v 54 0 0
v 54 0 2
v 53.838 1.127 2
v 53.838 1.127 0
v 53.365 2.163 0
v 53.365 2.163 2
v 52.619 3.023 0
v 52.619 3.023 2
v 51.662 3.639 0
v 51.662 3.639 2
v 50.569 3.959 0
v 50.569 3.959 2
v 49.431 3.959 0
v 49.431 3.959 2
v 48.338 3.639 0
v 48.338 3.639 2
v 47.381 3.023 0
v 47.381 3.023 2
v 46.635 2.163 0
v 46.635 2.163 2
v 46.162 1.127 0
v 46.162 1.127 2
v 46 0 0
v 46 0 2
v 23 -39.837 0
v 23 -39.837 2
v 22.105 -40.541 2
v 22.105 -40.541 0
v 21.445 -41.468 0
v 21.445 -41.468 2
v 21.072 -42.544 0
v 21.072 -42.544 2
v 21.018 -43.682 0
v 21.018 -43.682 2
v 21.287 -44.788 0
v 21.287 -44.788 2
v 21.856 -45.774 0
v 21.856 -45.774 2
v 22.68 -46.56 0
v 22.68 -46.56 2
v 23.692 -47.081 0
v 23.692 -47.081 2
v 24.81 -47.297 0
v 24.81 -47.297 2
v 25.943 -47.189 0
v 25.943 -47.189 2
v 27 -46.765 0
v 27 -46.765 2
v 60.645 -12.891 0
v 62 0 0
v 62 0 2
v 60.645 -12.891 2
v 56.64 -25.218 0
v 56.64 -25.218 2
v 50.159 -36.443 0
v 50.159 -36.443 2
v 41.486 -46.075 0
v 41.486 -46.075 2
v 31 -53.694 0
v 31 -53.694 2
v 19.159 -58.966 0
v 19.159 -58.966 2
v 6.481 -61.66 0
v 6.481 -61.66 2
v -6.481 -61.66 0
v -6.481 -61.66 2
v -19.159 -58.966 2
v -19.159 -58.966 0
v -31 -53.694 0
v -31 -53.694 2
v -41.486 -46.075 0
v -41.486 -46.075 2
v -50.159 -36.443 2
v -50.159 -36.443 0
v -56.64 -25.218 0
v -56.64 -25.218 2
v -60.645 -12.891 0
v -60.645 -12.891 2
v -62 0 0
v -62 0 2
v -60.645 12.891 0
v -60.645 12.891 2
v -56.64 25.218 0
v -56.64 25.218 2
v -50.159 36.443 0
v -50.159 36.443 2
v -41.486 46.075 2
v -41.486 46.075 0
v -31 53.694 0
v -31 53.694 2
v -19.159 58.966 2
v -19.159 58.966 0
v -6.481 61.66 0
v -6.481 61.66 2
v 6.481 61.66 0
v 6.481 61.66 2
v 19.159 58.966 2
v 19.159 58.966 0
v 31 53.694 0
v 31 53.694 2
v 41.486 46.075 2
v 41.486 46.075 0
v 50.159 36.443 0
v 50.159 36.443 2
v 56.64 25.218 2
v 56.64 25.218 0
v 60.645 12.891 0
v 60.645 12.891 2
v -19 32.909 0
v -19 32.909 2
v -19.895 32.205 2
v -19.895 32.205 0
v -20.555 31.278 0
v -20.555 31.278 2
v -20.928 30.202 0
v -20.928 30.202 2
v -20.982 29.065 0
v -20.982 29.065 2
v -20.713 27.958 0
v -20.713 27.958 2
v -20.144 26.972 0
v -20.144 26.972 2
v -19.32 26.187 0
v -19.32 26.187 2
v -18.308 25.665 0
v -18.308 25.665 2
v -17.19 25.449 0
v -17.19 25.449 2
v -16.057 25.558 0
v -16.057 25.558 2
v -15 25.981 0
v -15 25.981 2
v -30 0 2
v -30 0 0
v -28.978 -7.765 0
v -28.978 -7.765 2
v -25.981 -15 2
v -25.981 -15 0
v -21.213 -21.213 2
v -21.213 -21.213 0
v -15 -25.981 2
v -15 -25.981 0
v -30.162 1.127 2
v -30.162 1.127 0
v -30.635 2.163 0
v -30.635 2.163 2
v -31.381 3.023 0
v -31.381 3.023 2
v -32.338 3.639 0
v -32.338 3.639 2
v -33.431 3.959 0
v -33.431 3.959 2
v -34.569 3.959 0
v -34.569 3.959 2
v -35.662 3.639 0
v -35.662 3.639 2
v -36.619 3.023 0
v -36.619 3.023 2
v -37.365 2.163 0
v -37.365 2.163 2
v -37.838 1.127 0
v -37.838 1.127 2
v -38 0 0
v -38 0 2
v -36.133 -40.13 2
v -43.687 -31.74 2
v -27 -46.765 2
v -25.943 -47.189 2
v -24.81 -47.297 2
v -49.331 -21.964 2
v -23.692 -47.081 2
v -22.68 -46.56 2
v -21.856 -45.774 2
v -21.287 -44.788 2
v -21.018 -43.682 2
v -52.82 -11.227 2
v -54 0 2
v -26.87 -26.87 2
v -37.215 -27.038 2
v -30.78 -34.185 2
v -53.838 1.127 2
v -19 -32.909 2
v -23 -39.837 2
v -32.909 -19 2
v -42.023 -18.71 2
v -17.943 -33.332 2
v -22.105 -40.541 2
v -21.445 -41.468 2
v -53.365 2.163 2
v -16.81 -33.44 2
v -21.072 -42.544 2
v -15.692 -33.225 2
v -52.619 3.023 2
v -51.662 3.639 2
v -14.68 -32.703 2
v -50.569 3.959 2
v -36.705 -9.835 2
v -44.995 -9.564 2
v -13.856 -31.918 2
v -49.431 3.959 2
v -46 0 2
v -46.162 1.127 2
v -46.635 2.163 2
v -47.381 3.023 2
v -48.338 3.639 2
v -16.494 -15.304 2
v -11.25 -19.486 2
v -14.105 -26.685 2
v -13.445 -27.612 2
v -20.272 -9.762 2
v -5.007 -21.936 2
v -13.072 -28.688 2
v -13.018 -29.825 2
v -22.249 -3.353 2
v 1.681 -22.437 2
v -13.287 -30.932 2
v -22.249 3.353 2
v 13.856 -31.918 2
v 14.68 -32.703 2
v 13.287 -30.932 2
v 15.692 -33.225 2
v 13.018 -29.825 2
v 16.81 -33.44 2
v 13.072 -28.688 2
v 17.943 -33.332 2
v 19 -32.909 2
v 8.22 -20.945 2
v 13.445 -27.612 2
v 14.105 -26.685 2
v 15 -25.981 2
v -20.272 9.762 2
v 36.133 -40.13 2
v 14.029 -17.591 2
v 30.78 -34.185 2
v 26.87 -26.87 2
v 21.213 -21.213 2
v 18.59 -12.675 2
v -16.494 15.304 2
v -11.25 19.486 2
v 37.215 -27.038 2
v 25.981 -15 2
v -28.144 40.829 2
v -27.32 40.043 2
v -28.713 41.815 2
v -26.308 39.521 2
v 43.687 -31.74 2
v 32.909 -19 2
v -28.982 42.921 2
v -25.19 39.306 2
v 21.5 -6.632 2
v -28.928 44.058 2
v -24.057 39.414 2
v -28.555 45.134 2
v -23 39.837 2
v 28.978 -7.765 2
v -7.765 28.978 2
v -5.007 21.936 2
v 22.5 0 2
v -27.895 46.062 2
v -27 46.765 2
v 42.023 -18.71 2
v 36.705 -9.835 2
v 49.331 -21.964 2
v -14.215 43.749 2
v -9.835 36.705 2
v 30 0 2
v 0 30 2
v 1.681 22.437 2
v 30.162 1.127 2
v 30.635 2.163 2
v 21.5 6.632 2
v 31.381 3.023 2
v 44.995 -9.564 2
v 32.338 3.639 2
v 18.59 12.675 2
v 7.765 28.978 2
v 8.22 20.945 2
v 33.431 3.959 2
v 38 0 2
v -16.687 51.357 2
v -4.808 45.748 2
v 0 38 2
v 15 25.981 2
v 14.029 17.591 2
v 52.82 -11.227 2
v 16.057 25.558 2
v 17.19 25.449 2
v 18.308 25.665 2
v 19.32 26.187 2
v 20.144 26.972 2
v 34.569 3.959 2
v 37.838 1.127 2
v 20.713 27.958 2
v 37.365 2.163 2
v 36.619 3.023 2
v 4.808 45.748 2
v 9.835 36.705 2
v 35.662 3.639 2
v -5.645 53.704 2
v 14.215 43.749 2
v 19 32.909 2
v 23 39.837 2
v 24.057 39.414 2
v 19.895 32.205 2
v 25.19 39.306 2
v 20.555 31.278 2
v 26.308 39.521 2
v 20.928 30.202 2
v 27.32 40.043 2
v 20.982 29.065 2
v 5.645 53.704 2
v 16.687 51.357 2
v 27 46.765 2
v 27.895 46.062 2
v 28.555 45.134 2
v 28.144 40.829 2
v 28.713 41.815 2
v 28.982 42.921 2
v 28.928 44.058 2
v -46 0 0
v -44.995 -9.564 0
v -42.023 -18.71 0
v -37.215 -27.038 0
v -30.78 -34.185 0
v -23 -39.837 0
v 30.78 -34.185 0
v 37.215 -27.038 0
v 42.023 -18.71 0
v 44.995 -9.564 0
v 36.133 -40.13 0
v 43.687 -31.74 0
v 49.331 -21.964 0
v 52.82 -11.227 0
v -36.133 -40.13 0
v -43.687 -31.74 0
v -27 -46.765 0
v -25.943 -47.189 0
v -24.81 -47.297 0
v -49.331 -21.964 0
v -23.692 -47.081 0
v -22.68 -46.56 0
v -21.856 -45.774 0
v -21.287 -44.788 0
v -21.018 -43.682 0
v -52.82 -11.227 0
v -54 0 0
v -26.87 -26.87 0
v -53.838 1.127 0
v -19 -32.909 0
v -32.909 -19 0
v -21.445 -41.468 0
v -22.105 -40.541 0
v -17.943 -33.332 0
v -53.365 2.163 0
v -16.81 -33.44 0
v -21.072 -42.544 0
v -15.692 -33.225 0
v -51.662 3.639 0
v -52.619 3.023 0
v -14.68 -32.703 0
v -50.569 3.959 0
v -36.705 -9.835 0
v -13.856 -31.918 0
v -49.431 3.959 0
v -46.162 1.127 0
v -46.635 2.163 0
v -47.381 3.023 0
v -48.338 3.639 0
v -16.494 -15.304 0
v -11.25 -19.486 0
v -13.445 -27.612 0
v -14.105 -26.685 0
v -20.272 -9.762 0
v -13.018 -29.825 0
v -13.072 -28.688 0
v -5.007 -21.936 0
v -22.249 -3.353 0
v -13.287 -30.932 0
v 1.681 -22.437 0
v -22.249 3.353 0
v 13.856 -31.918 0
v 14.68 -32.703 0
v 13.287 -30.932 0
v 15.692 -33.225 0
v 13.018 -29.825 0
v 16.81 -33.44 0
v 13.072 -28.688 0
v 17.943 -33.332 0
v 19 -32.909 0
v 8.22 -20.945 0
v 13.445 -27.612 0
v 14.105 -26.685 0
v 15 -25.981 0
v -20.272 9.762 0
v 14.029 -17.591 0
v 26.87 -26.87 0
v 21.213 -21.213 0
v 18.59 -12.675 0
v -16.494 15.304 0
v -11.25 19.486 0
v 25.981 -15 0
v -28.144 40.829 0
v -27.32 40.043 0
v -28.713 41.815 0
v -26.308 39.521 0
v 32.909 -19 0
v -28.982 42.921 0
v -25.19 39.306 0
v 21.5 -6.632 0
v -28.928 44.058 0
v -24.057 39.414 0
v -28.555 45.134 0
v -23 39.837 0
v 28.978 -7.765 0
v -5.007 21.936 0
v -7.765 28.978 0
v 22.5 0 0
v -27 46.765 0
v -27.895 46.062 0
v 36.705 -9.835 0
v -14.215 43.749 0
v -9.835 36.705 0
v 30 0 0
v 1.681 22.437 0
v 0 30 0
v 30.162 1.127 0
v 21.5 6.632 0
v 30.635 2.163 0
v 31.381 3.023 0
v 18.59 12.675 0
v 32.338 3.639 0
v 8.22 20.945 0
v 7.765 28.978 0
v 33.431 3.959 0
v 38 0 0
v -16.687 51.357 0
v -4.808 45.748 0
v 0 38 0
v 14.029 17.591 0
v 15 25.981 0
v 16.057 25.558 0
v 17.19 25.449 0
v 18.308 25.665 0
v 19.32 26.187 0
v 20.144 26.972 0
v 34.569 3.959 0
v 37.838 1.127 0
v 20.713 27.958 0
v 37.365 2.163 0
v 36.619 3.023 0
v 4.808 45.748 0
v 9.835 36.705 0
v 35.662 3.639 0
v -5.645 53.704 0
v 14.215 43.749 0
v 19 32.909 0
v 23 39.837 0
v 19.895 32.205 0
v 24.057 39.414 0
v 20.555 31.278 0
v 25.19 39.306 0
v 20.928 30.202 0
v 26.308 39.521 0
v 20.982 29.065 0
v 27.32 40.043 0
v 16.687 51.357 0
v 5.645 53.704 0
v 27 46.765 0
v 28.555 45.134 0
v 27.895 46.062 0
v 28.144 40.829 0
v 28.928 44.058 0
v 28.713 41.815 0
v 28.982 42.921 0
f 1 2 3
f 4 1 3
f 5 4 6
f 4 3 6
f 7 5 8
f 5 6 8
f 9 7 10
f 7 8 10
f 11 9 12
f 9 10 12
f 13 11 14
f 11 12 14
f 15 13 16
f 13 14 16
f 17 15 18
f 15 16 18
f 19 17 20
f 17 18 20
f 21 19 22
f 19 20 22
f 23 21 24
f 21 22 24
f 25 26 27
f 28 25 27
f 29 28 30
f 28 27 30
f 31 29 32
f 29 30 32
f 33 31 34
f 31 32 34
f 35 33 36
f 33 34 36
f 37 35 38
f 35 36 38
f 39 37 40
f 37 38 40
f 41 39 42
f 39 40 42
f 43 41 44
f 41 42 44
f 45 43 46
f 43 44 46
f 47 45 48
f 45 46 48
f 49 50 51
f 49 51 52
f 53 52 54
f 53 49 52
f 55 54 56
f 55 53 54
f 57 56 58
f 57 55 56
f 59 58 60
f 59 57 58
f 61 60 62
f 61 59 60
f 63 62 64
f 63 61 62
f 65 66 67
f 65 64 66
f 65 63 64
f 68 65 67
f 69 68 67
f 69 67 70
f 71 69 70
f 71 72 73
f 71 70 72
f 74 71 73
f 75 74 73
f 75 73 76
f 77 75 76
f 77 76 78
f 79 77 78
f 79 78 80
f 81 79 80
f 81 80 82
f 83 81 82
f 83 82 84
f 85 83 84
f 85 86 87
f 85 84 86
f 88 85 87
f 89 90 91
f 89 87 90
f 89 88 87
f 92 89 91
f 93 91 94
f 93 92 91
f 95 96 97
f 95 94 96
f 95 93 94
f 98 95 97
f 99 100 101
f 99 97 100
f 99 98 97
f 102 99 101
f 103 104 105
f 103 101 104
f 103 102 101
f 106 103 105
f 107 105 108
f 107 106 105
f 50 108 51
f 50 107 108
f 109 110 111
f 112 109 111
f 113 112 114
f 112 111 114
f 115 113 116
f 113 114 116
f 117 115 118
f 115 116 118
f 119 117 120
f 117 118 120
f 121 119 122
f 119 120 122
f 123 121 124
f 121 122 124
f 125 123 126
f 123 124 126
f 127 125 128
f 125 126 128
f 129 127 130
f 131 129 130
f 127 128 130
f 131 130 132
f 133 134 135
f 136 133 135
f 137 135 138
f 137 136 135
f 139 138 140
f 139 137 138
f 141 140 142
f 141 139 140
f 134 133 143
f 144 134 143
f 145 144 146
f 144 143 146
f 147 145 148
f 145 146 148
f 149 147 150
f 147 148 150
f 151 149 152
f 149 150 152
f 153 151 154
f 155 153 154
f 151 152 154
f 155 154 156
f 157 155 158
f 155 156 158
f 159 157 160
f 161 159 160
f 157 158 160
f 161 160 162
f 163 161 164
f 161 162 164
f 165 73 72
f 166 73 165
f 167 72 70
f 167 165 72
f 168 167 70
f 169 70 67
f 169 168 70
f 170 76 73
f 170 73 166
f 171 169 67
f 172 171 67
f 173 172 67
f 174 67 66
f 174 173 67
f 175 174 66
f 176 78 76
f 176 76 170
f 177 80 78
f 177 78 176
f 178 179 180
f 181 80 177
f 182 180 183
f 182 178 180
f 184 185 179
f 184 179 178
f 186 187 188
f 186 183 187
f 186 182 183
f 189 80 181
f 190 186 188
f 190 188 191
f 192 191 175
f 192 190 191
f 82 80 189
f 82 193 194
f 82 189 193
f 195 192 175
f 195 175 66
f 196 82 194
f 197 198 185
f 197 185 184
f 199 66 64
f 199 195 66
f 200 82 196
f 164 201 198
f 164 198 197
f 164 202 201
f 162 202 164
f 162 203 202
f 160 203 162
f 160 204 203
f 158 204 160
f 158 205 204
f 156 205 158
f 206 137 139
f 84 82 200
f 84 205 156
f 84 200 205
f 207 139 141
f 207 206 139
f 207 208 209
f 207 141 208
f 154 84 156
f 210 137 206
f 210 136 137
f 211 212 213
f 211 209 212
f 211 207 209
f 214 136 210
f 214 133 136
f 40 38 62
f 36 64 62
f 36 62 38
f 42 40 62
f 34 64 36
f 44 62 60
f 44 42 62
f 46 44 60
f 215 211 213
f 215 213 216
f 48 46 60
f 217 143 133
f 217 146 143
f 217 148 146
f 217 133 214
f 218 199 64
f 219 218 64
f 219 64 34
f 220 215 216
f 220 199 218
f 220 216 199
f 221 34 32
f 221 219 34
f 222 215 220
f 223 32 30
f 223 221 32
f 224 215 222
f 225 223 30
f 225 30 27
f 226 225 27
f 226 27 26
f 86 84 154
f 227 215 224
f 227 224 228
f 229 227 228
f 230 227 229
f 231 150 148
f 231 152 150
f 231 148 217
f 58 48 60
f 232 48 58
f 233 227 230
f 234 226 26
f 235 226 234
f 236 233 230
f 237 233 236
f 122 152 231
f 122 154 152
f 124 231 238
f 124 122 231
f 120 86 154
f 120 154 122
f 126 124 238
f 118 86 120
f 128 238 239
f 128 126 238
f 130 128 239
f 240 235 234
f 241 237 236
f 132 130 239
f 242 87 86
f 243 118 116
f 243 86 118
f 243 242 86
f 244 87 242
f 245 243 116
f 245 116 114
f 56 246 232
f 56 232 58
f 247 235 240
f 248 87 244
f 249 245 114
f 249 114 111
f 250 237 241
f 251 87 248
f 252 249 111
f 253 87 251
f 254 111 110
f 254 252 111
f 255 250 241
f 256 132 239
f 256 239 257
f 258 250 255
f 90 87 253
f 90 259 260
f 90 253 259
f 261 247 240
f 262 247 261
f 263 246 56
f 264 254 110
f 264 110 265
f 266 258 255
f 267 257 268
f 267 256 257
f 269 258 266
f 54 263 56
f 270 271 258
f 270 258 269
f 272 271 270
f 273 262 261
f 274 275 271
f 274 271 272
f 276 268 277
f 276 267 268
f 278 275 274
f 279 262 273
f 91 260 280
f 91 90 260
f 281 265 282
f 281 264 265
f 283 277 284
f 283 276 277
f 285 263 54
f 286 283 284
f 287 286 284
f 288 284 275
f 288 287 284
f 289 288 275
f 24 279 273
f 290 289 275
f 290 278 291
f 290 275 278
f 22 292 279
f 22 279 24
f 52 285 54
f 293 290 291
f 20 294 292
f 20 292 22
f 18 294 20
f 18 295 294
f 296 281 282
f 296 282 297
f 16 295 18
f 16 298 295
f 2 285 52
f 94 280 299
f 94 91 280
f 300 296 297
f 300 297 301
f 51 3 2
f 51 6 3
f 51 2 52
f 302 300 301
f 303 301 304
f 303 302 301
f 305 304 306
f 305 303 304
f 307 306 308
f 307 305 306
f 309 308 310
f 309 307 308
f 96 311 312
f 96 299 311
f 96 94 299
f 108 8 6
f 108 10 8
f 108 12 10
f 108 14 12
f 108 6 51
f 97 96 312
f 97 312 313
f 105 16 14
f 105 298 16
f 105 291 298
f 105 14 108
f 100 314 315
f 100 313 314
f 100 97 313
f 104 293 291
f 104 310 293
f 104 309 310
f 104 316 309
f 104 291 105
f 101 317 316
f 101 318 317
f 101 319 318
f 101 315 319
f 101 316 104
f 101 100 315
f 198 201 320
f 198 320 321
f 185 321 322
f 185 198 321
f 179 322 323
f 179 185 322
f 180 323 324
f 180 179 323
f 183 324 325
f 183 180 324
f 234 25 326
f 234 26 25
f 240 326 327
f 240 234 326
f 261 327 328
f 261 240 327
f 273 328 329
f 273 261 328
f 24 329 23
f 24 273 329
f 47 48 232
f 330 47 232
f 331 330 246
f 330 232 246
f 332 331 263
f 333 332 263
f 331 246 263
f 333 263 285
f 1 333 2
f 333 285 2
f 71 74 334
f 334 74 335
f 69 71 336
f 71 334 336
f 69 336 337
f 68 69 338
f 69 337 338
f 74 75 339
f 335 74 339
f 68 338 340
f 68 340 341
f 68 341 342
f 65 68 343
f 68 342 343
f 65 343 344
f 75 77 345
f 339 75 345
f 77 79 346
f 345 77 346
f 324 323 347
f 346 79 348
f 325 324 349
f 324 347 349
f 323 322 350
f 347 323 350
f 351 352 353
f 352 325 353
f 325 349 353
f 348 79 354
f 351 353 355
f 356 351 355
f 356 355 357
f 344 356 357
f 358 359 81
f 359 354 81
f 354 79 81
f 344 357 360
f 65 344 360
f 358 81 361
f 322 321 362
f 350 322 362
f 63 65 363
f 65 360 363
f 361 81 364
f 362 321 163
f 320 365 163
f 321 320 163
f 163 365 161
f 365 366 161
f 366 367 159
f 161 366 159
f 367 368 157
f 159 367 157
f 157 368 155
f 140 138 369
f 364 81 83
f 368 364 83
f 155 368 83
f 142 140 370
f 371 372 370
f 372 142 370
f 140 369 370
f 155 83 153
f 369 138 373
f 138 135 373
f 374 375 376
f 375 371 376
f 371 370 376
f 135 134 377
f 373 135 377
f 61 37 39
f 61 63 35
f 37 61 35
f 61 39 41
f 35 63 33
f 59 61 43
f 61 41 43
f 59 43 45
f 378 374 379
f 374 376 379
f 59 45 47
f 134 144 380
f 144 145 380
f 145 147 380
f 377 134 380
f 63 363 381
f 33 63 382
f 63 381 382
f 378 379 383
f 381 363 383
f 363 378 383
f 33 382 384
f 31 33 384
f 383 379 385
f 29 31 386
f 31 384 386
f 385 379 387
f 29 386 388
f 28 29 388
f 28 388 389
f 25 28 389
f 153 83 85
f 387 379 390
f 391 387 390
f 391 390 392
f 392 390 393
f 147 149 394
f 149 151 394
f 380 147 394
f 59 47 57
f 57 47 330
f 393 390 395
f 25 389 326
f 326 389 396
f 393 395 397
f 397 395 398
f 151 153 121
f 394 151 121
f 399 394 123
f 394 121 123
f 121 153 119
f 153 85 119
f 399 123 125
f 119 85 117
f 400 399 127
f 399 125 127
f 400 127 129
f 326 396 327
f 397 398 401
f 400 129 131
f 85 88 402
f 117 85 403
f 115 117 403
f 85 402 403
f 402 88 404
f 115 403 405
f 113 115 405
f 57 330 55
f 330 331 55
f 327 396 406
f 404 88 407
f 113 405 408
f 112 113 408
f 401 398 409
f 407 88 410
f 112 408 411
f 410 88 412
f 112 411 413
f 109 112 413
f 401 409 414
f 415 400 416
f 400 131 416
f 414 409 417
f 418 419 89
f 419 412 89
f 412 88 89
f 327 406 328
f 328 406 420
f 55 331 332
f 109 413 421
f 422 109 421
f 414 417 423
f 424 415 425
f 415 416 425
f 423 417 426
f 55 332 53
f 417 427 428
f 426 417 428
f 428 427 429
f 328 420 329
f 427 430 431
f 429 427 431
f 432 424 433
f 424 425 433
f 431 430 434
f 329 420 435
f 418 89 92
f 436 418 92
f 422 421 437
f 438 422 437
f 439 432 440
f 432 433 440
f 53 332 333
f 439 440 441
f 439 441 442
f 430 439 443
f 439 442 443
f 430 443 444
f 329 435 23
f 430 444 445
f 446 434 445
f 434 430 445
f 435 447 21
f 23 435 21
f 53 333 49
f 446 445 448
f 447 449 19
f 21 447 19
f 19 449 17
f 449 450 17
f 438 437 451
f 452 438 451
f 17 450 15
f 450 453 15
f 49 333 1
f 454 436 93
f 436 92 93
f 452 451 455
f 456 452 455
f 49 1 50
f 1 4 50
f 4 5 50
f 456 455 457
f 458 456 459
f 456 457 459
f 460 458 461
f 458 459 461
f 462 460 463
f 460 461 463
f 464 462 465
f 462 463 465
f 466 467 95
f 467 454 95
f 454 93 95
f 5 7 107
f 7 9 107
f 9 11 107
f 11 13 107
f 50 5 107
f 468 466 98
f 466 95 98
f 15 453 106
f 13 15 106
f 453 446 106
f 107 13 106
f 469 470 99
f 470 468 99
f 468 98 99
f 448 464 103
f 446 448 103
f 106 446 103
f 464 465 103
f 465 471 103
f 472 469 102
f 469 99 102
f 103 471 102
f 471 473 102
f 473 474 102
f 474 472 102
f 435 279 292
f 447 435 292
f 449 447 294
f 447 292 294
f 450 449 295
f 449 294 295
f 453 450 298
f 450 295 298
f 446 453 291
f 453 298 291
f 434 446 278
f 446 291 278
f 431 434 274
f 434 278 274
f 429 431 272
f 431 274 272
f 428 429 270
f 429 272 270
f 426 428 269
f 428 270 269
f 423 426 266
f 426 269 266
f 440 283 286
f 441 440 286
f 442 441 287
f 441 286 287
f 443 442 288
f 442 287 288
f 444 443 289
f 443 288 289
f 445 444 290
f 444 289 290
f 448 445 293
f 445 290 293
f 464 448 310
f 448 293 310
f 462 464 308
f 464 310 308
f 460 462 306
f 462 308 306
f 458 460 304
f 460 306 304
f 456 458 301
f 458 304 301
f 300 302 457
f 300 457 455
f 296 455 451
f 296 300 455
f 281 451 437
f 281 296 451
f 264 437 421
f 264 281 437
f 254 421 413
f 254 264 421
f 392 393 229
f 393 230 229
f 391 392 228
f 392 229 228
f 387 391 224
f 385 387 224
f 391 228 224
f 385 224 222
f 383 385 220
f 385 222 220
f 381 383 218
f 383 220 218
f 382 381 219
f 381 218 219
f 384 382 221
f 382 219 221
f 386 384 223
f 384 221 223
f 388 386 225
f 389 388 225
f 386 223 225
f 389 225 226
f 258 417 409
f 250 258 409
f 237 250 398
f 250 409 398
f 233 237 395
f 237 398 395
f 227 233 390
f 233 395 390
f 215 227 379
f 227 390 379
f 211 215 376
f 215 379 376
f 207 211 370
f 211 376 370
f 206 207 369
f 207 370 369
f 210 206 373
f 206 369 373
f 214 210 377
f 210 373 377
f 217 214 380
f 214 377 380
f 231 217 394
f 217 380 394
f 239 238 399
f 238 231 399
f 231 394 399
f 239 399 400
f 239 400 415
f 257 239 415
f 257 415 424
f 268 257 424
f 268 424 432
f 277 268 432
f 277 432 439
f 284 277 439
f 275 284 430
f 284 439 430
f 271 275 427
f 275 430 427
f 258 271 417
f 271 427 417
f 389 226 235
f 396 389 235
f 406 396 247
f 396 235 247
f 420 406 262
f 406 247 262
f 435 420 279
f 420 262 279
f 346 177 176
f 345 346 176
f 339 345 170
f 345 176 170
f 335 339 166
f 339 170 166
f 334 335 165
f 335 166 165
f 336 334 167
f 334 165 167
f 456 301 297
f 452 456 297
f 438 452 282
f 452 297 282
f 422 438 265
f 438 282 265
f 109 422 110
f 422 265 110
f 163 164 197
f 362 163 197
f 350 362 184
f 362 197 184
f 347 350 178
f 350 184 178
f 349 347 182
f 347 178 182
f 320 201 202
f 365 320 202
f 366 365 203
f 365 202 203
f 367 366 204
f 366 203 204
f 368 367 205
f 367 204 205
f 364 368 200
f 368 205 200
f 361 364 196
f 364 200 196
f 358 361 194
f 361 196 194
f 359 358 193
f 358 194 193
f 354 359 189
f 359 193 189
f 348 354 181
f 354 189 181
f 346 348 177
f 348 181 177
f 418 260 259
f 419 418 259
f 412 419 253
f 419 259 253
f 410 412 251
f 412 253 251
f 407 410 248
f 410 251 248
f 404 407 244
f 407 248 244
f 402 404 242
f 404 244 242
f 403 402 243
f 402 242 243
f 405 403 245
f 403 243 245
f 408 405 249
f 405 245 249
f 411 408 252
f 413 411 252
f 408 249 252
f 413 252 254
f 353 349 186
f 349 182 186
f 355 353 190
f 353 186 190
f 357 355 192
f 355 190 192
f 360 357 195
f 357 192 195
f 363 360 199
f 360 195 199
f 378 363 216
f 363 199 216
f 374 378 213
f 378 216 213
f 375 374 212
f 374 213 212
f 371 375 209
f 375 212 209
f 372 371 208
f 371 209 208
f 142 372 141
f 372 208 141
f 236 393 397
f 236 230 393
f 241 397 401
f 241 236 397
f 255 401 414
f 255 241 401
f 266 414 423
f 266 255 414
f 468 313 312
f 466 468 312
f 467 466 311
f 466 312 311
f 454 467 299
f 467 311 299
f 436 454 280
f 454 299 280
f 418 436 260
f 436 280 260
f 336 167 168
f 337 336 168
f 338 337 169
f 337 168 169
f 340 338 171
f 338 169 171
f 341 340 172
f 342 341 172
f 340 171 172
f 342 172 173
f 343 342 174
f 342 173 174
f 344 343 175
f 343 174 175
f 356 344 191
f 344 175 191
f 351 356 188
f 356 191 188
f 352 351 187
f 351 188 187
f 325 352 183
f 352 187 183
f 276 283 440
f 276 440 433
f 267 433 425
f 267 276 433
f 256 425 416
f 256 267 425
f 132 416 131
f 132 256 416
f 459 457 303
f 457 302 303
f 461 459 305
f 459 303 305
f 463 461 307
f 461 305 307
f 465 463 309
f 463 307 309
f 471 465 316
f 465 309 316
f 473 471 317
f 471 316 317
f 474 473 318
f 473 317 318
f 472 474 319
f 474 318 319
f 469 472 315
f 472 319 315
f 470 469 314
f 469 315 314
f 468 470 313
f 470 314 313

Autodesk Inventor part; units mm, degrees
ref_plane "YZ Plane" through (0, 0, 0) normal (1, 0, 0) x (0, 1, 0)
ref_plane "XZ Plane" through (0, 0, 0) normal (0, 1, 0) x (-1, 0, 0)
ref_plane "XY Plane" through (0, 0, 0) normal (0, 0, 1) x (1, 0, 0)
sketch "Эскиз1" plane through (0, 0, 0) normal (0, 0, 1) x (1, 0, 0)
  circle A0 centre (0, 0) radius 62
  circle A1 centre (0, 0) radius 22.5
  dimension "d0" = 124
  dimension "d15" = 45
extrude "Выдавливание1" add sketch "Эскиз1" along normal blind 2
sketch "Эскиз2" plane through (0, 0, 2) normal (0, 0, 1) x (1, 0, 0)
  arc A0 (17, 29.4449) -> (-17, 29.4449) centre (0, 0) ccw construction
  arc A1 (19, 32.909) -> (-19, 32.909) centre (0, 0) ccw
  arc A2 (15, 25.9808) -> (-15, 25.9808) centre (0, 0) ccw
  arc A3 (15, 25.9808) -> (19, 32.909) centre (17, 29.4449) ccw
  arc A4 (-19, 32.909) -> (-15, 25.9808) centre (-17, 29.4449) ccw
  line L0 (0, 0) -> (-17, 29.4449) construction
  line L1 (0, 0) -> (34, 0) construction
  line L2 (0, 0) -> (17, 29.4449) construction
  arc A5 (25, 43.3013) -> (-25, 43.3013) centre (0, 0) ccw construction
  arc A6 (27, 46.7654) -> (-27, 46.7654) centre (0, 0) ccw
  arc A7 (23, 39.8372) -> (-23, 39.8372) centre (0, 0) ccw
  arc A8 (23, 39.8372) -> (27, 46.7654) centre (25, 43.3013) ccw
  arc A9 (-27, 46.7654) -> (-23, 39.8372) centre (-25, 43.3013) ccw
  line L3 (0, 0) -> (-25, 43.3013) construction
  line L4 (0, 0) -> (50, 0) construction
  line L5 (0, 0) -> (25, 43.3013) construction
  arc A10 (33, 57.1577) -> (-33, 57.1577) centre (0, 0) ccw construction
  line L6 (0, 0) -> (-33, 57.1577) construction
  line L7 (0, 0) -> (66, 0) construction
  line L8 (0, 0) -> (33, 57.1577) construction
  dimension "d3" = 34
  dimension "d4" = 120
  dimension "d5" = 60
  dimension "d6" = 8
  dimension "d7" = 50
  dimension "d8" = 120
  dimension "d9" = 60
  dimension "d10" = 8
  dimension "d11" = 66
  dimension "d12" = 120
  dimension "d13" = 60
extrude "Выдавливание2" cut sketch "Эскиз2" against normal through all
pattern_circular "Круговой массив1" count 3 over 360 about axis through (0, 0, 0) along (0, 0, 1) of "Выдавливание2"
properties part number "Ограничитель" material "Сталь, высокопрочная, низколегированная"
